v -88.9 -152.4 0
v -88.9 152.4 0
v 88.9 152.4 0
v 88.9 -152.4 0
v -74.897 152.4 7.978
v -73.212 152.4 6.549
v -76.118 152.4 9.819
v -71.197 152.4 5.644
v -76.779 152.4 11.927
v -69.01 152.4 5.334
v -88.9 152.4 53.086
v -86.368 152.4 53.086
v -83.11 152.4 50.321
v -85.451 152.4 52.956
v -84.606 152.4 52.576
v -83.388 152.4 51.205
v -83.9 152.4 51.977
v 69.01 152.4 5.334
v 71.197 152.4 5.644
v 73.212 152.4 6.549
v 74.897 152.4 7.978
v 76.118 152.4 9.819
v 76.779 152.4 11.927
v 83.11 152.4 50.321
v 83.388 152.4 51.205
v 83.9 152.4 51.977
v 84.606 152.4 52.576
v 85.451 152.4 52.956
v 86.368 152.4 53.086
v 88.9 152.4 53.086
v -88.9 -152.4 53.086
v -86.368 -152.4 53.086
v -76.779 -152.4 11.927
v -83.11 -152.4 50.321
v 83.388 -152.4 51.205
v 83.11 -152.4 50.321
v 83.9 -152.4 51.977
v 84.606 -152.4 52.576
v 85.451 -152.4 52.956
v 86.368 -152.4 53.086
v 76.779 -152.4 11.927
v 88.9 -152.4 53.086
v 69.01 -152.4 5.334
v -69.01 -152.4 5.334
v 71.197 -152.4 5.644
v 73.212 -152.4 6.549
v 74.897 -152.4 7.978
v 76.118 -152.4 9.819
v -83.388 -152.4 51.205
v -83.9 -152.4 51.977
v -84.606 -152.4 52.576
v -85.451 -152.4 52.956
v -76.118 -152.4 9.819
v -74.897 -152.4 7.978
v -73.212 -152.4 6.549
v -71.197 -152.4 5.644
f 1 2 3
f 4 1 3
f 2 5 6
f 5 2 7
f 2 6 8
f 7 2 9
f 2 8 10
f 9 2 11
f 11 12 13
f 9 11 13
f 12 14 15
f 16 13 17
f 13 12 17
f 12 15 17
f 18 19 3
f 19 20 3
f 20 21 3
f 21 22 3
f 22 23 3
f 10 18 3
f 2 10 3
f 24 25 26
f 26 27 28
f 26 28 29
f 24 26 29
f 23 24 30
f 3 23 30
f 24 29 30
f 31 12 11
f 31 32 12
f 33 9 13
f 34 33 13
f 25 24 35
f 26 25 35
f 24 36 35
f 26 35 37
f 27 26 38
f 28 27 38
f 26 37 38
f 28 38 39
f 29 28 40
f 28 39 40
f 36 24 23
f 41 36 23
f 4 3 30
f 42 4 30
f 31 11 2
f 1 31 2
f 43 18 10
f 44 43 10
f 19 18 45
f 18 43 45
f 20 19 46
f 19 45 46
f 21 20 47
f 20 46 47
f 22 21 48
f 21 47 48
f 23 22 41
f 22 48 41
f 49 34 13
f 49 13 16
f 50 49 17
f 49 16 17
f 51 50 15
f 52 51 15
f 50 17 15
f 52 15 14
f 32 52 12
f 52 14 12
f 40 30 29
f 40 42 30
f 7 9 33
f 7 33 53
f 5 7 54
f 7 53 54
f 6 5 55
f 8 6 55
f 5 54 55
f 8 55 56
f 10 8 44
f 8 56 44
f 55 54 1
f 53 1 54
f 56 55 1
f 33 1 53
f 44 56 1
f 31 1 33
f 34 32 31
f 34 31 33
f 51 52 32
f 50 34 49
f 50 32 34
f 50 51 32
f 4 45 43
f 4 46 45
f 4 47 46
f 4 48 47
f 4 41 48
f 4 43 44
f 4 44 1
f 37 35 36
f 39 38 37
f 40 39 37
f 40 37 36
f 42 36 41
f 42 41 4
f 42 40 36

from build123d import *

# Parameters (mm, degrees)
F1_DEPTH = 152.4
F2_R     = 7.874
F3_R     = 3.302


with BuildPart() as f1:
    # F0 (on Front) → F1 (new body, symmetric)
    with BuildSketch(Plane.XZ):
        Polygon((-88.9, 0), (0, 0), (88.9, 0), (88.9, 53.086), (83.566, 53.086), (75.692, 5.334), (0, 5.334), (-75.692, 5.334), (-83.566, 53.086), (-88.9, 53.086), align=None)
    extrude(amount=F1_DEPTH, both=True)

    # F2
    f2_edges = [f1.edges().sort_by_distance(p)[0] for p in [
        (-75.692, 0, 5.334),
        (75.692, 0, 5.334),
    ]]
    fillet(f2_edges, radius=F2_R)

    # F3
    f3_edges = [f1.edges().sort_by_distance(p)[0] for p in [
        (83.566, 0, 53.086),
        (-83.566, 0, 53.086),
    ]]
    fillet(f3_edges, radius=F3_R)


solid = f1.part
